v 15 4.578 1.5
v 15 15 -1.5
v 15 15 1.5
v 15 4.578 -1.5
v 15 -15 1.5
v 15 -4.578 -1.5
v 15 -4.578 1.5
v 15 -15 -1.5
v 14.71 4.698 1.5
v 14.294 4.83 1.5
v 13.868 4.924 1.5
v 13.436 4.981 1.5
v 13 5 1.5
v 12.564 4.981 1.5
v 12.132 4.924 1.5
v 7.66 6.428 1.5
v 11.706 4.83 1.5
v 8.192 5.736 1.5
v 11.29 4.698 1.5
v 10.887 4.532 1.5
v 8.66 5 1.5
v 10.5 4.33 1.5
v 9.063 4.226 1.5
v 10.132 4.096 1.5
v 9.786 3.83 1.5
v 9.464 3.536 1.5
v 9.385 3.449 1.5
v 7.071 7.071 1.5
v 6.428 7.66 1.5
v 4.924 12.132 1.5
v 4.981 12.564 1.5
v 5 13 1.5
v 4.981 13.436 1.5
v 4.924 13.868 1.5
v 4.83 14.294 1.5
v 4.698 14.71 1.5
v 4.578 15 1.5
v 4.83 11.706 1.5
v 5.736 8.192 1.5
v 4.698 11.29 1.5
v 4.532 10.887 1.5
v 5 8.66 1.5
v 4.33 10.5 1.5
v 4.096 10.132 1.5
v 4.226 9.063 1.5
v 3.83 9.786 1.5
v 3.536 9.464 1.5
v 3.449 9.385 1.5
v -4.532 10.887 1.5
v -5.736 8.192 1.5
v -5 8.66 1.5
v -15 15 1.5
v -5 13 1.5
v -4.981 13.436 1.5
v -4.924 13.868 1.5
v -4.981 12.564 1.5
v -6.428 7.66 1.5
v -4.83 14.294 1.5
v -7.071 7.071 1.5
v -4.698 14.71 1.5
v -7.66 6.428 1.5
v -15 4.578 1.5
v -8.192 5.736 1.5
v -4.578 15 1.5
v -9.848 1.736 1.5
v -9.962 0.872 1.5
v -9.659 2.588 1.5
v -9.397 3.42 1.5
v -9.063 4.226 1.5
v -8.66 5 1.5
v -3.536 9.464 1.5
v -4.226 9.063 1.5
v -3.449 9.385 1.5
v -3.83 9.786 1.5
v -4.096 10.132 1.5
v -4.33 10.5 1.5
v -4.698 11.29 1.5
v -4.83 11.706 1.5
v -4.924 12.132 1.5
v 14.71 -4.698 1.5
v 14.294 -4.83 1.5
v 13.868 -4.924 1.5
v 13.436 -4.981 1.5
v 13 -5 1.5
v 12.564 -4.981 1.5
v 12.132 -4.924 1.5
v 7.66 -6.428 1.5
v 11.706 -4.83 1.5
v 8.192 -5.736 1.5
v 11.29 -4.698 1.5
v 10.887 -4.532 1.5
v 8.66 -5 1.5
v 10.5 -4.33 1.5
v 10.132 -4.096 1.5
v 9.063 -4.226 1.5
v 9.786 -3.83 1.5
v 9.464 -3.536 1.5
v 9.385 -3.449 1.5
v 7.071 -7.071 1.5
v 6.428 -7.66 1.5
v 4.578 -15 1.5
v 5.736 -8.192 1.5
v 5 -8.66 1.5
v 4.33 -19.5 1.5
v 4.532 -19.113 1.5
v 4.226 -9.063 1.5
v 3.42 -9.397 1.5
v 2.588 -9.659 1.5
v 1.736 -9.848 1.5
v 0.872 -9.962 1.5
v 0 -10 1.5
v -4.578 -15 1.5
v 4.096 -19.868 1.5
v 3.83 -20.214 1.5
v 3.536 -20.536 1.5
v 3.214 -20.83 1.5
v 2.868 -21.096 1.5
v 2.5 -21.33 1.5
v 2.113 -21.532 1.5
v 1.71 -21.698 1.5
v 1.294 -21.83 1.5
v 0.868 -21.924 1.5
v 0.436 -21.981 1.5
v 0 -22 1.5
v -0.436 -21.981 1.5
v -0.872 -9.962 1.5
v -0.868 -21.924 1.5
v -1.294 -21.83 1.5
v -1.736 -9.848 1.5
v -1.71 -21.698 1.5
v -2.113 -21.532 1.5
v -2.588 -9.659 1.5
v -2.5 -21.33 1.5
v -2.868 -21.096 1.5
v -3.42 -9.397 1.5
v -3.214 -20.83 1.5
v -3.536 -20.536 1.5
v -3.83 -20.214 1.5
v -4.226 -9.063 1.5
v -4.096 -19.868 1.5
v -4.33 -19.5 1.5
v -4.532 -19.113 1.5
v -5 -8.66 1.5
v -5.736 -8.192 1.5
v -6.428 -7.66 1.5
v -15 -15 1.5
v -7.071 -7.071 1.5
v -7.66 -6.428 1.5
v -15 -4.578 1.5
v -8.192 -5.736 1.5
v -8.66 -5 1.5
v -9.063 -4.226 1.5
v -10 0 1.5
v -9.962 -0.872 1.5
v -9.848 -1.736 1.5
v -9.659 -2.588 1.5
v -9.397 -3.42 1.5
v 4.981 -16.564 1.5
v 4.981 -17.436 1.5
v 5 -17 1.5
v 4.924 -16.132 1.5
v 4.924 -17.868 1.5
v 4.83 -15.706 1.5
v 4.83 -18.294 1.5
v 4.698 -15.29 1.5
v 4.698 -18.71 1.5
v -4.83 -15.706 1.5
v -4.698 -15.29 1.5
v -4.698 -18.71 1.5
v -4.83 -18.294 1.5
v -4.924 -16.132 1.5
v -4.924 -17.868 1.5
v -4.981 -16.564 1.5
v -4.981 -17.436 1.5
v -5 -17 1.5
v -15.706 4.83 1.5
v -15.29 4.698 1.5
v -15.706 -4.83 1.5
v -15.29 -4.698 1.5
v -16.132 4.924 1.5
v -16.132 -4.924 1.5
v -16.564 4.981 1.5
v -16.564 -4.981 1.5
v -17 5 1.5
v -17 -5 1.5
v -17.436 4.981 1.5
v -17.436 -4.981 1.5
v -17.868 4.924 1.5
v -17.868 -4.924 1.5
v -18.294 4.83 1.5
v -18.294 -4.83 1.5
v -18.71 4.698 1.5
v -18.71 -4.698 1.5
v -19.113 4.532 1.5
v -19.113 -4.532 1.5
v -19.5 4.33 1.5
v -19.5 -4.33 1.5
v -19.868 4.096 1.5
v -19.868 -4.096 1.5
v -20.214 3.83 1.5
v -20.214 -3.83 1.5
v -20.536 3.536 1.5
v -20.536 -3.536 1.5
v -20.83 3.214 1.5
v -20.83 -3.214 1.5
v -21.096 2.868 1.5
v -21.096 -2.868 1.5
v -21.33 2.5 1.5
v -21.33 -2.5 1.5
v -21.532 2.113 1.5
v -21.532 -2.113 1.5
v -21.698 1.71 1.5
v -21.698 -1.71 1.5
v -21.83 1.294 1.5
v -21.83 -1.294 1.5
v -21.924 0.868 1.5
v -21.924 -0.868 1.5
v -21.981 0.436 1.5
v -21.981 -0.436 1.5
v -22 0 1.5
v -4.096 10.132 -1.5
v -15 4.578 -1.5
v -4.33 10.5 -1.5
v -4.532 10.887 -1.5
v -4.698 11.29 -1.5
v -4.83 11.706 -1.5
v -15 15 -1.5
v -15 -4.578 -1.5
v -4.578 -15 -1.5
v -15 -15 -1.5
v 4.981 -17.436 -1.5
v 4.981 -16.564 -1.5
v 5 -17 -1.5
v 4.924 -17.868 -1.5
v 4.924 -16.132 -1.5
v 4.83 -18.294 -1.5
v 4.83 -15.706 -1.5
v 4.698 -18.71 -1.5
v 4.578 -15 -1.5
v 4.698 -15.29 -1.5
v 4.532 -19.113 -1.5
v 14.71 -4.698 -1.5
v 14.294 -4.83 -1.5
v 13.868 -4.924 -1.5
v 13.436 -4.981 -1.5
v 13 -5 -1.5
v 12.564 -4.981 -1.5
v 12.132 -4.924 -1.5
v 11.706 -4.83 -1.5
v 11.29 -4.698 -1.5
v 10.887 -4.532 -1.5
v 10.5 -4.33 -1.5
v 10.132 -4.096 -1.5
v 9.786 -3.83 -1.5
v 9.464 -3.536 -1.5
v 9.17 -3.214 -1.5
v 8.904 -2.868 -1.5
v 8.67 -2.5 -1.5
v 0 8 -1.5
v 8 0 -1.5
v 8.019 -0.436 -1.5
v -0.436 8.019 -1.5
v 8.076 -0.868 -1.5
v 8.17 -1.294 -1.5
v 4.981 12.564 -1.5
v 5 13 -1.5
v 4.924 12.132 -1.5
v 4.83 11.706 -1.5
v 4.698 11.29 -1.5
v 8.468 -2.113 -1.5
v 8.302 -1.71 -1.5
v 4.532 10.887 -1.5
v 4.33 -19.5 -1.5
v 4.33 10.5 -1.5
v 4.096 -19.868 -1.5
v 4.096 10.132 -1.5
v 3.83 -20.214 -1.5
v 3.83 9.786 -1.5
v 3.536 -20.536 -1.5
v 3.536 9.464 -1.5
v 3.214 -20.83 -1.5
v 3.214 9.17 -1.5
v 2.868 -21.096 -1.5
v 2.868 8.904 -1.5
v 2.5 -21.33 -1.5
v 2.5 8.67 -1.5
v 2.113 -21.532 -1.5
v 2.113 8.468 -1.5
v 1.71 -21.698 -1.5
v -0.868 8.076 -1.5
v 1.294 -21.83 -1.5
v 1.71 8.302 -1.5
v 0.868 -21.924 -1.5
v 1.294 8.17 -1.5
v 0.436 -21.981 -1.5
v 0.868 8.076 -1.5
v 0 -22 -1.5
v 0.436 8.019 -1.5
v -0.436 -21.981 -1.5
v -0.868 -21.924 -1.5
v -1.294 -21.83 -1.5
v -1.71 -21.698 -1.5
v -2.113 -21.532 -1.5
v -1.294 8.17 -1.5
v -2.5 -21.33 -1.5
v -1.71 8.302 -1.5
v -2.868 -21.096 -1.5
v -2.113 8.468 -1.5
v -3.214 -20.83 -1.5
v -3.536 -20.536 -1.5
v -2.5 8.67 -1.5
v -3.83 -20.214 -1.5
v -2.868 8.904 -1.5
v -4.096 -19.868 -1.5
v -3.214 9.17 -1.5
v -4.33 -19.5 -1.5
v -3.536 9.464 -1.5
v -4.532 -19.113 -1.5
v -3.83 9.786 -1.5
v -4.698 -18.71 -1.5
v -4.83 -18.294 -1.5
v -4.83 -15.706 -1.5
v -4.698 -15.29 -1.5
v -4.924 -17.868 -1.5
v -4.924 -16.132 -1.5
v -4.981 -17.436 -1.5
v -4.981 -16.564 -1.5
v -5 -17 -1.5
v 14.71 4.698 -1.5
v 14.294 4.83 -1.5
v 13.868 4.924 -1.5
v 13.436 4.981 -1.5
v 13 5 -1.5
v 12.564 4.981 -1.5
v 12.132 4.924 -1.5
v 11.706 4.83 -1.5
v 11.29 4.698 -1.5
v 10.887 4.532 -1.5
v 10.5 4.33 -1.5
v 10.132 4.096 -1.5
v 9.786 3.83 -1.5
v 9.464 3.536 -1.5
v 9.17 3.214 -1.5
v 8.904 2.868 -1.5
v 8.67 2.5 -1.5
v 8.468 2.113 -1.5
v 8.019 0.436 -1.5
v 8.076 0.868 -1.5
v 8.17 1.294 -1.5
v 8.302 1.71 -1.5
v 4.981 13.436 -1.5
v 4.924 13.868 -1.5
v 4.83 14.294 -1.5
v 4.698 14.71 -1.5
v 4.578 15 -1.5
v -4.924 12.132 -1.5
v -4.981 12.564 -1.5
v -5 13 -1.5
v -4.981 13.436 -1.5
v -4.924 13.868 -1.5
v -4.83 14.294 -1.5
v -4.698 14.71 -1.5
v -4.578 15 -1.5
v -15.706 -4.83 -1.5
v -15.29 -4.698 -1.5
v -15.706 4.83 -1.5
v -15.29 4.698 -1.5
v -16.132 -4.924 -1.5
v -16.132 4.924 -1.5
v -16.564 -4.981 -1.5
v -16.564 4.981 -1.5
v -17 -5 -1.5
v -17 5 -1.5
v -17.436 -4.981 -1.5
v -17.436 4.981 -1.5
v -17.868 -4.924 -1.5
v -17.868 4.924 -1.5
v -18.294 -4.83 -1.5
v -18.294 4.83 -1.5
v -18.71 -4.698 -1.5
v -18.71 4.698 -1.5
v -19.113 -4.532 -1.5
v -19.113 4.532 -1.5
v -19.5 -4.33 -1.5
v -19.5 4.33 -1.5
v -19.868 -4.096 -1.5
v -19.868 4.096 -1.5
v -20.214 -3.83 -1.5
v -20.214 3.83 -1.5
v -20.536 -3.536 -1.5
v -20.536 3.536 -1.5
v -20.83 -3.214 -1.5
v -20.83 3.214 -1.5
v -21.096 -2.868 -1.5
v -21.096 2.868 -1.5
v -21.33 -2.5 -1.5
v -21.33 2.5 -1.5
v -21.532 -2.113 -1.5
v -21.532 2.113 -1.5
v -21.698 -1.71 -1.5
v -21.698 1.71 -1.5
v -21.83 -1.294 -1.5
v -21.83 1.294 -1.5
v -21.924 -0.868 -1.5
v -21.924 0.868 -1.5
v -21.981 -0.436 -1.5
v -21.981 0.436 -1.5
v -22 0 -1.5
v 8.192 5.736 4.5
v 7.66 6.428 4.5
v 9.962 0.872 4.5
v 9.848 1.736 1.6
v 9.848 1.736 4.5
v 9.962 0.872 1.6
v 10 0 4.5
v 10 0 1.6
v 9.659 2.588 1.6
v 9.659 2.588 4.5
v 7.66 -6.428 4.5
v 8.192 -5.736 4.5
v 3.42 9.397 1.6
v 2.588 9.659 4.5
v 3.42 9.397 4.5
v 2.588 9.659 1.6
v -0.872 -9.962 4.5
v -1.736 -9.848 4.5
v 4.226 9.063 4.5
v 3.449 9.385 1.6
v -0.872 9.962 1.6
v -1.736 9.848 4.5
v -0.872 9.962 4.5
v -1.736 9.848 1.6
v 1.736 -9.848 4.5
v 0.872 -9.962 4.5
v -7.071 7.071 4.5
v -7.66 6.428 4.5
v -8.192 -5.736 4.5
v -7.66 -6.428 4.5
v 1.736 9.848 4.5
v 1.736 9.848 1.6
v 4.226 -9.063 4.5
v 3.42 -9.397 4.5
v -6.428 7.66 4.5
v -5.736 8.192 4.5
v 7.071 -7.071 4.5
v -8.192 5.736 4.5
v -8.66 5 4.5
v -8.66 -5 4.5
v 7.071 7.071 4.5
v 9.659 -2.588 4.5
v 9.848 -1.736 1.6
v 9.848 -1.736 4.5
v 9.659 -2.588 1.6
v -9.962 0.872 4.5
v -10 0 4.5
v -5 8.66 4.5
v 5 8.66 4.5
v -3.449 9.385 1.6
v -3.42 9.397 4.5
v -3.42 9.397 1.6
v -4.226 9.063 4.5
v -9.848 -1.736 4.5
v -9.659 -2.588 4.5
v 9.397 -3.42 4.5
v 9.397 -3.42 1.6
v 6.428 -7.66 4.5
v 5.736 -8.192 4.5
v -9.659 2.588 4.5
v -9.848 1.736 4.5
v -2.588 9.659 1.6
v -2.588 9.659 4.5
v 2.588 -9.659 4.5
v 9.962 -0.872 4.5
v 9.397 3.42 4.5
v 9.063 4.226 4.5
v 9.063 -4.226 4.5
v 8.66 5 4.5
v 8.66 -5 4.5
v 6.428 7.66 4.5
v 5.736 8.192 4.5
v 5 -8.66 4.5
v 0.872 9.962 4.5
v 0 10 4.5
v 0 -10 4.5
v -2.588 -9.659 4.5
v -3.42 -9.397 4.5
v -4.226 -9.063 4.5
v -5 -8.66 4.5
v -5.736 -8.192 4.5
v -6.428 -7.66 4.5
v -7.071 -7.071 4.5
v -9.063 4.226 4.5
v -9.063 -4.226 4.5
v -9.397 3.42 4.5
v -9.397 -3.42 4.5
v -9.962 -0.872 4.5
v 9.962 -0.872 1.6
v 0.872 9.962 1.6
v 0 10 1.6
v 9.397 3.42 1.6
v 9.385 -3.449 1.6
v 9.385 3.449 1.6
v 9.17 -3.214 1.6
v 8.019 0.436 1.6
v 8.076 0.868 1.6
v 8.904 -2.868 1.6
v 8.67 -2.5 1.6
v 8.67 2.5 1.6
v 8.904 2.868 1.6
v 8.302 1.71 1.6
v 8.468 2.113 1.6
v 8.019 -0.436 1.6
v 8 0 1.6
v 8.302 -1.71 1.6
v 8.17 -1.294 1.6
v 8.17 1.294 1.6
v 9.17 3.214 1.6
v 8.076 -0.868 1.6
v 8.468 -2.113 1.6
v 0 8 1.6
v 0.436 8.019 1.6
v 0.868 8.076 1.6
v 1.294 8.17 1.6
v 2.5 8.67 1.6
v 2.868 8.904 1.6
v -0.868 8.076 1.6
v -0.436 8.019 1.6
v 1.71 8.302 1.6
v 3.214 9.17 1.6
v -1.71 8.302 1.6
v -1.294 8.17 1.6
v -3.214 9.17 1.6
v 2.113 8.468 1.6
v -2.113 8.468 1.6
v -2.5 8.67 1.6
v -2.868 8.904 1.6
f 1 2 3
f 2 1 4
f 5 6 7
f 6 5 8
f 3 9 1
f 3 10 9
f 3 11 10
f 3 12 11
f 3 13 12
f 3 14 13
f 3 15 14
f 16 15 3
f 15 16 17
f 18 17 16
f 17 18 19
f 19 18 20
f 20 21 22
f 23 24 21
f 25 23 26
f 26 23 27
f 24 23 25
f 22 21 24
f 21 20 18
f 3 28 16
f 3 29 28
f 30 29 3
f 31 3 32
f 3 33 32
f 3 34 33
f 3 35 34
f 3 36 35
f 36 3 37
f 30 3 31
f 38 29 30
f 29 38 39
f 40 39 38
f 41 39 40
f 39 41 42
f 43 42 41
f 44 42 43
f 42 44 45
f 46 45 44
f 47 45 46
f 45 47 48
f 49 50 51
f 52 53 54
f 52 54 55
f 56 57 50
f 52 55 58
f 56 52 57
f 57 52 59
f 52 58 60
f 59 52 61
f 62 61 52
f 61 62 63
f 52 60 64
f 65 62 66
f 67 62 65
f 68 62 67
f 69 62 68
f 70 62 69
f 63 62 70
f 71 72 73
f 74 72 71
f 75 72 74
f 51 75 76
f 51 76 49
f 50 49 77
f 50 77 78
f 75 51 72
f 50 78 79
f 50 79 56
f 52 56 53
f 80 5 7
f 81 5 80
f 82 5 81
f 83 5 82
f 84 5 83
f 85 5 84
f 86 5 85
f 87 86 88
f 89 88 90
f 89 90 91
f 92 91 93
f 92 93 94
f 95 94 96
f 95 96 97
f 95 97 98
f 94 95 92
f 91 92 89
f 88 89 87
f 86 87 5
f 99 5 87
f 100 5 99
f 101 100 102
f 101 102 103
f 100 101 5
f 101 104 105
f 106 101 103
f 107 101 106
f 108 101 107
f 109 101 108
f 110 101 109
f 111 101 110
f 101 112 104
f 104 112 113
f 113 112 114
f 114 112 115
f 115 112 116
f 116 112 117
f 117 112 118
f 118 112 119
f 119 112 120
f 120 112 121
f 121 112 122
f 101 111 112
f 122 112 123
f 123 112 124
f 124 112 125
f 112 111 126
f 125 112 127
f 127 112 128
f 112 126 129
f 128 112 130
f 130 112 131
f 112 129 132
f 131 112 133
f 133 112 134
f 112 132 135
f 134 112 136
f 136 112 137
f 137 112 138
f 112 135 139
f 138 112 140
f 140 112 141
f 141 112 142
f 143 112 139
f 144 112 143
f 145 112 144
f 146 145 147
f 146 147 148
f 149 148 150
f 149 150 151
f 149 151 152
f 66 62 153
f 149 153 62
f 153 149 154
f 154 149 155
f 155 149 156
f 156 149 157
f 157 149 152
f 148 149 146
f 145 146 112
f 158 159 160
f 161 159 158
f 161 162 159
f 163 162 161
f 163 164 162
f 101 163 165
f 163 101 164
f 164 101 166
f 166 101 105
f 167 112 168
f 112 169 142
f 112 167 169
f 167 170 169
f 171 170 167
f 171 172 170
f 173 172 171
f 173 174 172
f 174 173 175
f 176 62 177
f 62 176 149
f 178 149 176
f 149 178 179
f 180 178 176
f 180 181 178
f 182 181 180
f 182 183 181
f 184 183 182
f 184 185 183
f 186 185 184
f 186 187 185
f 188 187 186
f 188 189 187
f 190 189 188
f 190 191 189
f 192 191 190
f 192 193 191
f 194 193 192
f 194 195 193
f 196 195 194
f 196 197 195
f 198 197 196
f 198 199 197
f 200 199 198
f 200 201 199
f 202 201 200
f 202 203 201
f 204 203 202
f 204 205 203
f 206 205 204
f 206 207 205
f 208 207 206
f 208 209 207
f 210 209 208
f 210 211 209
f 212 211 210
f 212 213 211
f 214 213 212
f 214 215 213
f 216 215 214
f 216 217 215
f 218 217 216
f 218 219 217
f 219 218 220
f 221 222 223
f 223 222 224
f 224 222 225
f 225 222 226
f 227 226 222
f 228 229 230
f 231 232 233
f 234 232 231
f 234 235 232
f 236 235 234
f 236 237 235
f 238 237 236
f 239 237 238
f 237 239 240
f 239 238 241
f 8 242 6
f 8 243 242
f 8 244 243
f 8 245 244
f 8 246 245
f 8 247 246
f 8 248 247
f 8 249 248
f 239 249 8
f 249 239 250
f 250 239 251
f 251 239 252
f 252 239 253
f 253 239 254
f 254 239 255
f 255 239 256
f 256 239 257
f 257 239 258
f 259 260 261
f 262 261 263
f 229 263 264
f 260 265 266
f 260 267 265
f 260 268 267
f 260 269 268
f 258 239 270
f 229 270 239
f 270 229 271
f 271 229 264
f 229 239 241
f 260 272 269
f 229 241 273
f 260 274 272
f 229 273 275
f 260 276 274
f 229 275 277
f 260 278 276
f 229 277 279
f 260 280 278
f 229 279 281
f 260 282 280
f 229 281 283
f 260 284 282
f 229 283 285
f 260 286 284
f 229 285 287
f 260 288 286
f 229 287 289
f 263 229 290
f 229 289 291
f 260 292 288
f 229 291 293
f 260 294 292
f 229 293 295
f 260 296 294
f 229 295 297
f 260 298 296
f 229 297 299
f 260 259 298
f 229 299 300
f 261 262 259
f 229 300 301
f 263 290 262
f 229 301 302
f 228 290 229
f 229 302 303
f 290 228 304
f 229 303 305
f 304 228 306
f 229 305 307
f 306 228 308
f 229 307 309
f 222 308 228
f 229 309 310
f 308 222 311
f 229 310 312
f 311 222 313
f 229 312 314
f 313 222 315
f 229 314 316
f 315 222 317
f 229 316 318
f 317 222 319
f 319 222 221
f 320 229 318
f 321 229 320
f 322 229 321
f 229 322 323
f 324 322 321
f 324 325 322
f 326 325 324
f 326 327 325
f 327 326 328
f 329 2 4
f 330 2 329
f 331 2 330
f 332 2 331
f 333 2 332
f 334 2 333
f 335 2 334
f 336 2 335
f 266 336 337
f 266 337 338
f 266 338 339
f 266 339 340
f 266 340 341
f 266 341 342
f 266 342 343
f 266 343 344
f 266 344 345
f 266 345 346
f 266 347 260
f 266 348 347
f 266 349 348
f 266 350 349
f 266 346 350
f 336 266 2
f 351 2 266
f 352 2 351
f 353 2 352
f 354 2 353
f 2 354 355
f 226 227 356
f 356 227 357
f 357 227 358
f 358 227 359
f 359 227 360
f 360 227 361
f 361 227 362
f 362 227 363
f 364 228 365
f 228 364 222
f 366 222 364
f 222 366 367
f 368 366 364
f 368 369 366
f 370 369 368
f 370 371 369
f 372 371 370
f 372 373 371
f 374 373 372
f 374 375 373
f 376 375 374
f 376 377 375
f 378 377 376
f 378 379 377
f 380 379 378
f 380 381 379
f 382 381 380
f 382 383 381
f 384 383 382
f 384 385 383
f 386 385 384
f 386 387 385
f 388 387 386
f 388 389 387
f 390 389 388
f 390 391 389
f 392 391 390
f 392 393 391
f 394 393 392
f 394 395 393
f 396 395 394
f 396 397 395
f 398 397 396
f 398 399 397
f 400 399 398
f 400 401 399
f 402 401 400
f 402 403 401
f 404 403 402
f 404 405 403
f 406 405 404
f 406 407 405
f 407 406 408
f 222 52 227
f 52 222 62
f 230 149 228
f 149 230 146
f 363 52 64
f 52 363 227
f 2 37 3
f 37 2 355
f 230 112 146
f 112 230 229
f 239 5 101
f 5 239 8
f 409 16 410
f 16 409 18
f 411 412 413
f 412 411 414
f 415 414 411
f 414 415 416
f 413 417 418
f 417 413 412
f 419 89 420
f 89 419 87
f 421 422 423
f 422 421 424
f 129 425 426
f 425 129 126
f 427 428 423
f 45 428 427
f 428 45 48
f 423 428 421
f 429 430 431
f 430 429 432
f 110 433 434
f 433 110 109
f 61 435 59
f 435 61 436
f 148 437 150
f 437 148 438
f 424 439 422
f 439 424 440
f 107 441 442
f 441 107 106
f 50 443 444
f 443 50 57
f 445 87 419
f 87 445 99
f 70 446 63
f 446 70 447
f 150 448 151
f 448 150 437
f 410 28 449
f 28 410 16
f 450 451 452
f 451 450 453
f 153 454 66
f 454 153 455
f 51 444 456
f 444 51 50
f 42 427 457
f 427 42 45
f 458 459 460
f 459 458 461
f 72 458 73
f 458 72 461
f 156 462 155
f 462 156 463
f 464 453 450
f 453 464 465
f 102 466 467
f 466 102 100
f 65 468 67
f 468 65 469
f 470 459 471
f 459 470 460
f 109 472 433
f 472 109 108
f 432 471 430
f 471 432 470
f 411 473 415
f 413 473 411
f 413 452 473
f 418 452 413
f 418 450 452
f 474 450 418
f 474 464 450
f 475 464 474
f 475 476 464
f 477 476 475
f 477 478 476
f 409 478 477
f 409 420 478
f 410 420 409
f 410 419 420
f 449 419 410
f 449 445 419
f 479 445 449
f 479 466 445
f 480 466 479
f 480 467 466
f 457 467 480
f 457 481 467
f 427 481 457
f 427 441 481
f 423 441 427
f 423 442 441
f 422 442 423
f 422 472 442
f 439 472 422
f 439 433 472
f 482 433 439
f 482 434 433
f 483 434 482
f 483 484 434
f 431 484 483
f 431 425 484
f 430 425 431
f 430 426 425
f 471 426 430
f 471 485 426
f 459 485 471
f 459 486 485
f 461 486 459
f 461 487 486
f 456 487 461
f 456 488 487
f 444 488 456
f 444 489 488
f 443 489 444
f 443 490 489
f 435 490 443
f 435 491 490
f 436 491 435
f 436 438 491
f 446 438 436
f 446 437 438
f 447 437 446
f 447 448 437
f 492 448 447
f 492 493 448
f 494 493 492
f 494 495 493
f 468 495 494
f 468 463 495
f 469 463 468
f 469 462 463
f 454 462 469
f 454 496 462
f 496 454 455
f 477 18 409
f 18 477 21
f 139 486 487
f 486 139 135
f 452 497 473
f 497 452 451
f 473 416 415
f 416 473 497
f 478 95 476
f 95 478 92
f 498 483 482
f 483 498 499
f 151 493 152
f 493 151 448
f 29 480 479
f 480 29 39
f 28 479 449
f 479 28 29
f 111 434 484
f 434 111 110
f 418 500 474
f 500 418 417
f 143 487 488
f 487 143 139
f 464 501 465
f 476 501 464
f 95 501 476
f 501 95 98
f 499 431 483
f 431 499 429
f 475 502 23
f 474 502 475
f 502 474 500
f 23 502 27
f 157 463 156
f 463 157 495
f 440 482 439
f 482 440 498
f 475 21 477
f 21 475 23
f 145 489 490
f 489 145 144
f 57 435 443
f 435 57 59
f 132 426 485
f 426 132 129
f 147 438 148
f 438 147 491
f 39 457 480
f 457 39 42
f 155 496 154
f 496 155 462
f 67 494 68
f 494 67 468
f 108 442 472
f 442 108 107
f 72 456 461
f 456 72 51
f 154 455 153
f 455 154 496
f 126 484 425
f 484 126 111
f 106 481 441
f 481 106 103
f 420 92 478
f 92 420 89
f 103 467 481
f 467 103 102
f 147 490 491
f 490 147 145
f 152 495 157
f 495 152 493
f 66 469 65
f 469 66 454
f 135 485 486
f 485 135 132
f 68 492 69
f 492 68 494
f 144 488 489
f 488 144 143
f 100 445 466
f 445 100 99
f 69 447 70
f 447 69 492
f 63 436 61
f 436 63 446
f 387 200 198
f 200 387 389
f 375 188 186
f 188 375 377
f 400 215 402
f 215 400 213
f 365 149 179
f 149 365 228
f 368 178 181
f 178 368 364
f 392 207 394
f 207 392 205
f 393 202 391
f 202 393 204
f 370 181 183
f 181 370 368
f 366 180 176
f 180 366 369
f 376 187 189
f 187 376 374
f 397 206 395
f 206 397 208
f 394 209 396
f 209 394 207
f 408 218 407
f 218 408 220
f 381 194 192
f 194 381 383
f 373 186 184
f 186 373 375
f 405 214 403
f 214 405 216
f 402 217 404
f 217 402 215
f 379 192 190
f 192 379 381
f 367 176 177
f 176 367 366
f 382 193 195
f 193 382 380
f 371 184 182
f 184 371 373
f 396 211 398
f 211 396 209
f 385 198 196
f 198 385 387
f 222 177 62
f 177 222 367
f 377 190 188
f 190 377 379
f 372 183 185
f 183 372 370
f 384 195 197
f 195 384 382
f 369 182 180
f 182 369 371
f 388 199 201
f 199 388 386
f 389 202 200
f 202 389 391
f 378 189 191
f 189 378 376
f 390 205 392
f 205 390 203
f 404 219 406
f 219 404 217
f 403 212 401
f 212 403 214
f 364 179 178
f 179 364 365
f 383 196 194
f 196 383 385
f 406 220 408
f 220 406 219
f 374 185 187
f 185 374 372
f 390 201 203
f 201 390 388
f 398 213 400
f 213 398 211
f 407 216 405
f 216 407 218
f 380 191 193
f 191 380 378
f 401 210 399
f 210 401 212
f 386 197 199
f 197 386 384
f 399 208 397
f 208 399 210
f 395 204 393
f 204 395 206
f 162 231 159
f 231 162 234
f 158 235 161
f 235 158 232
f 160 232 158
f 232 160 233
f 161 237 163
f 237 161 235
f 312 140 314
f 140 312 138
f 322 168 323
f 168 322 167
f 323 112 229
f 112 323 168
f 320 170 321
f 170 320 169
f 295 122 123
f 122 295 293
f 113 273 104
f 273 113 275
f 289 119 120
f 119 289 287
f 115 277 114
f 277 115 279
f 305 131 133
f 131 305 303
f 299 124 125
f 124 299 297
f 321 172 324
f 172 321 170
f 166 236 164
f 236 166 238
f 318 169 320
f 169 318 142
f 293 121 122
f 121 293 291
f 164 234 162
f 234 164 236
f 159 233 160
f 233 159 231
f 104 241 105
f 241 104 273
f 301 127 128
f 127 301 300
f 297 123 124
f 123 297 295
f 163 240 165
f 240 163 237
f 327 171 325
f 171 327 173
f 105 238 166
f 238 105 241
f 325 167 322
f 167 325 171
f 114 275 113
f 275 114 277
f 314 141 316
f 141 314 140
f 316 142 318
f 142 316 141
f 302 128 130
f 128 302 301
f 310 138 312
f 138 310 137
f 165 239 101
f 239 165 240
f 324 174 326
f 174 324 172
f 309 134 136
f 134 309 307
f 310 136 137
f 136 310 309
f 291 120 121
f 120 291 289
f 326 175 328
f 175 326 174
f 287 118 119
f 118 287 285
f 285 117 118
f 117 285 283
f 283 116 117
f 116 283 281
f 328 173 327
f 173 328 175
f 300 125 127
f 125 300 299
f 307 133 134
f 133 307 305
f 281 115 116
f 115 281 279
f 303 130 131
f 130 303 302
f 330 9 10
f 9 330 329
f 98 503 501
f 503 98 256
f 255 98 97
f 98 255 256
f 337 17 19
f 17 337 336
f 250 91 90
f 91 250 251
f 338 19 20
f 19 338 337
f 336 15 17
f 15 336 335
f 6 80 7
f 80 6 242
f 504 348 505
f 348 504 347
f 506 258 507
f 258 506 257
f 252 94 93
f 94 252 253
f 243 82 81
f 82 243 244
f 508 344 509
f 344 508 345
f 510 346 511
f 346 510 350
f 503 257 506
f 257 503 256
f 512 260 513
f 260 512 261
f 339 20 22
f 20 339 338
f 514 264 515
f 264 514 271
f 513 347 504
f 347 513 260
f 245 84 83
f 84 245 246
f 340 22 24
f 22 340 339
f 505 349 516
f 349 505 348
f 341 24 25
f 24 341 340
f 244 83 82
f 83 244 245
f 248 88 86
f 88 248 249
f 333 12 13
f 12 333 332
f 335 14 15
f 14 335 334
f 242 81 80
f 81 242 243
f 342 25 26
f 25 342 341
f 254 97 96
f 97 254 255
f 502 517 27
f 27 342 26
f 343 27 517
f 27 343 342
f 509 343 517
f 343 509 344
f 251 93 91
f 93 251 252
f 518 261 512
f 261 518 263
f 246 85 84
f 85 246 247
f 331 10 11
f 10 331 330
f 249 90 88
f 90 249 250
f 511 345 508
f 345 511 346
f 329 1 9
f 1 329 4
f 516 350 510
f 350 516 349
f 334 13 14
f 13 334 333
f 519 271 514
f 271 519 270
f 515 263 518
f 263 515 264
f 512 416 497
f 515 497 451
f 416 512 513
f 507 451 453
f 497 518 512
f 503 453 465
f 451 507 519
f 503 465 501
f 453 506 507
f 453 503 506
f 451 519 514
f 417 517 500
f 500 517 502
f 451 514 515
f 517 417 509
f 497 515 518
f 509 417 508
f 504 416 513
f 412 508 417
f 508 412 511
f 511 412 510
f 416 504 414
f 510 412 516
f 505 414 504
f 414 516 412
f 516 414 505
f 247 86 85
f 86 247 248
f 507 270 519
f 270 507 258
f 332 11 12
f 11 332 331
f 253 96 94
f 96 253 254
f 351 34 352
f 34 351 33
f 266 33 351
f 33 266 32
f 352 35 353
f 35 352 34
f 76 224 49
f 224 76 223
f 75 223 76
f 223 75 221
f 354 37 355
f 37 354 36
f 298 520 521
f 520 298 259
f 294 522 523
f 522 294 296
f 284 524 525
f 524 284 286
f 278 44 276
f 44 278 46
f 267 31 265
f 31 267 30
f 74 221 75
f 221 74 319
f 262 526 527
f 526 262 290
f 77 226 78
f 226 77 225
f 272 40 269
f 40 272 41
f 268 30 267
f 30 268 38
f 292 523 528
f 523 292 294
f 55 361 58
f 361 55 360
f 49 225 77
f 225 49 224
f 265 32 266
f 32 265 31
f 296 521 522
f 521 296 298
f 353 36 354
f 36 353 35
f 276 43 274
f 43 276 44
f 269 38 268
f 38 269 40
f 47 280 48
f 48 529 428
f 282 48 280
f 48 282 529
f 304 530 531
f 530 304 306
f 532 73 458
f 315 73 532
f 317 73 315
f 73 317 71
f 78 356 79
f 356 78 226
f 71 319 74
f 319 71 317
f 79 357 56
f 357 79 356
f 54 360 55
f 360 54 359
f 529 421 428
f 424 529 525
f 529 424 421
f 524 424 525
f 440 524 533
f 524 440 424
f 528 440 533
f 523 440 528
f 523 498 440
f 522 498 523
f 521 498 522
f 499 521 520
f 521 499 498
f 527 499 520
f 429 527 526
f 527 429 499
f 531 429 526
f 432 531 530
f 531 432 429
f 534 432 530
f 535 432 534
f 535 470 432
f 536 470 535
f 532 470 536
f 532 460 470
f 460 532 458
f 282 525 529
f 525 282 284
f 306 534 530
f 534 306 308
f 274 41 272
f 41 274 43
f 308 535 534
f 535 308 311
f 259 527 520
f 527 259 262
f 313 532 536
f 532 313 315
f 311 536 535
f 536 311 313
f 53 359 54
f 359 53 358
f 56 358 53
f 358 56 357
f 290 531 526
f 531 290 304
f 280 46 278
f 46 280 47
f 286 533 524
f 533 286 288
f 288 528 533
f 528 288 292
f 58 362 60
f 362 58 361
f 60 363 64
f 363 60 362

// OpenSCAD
$fa=5; $fs=0.1;

// стыкабельное основание
module base(){
	difference(){
		union(){
			cube([30,30,3], center=true);	 // база
			translate([0, 0, 3]) cylinder(h=3, r=10, center=true);
			translate([-17, 0, 0]) cylinder(h=3, r=5, center=true); // выступы
			translate([0, -17, 0]) cylinder(h=3, r=5, center=true);
		}

		union(){
			translate([13, 0, 0]) cylinder(h=3.2, r=5, center=true); // прорези
			translate([0, 13, 0]) cylinder(h=3.2, r=5, center=true);
		}
	}
}

base();
